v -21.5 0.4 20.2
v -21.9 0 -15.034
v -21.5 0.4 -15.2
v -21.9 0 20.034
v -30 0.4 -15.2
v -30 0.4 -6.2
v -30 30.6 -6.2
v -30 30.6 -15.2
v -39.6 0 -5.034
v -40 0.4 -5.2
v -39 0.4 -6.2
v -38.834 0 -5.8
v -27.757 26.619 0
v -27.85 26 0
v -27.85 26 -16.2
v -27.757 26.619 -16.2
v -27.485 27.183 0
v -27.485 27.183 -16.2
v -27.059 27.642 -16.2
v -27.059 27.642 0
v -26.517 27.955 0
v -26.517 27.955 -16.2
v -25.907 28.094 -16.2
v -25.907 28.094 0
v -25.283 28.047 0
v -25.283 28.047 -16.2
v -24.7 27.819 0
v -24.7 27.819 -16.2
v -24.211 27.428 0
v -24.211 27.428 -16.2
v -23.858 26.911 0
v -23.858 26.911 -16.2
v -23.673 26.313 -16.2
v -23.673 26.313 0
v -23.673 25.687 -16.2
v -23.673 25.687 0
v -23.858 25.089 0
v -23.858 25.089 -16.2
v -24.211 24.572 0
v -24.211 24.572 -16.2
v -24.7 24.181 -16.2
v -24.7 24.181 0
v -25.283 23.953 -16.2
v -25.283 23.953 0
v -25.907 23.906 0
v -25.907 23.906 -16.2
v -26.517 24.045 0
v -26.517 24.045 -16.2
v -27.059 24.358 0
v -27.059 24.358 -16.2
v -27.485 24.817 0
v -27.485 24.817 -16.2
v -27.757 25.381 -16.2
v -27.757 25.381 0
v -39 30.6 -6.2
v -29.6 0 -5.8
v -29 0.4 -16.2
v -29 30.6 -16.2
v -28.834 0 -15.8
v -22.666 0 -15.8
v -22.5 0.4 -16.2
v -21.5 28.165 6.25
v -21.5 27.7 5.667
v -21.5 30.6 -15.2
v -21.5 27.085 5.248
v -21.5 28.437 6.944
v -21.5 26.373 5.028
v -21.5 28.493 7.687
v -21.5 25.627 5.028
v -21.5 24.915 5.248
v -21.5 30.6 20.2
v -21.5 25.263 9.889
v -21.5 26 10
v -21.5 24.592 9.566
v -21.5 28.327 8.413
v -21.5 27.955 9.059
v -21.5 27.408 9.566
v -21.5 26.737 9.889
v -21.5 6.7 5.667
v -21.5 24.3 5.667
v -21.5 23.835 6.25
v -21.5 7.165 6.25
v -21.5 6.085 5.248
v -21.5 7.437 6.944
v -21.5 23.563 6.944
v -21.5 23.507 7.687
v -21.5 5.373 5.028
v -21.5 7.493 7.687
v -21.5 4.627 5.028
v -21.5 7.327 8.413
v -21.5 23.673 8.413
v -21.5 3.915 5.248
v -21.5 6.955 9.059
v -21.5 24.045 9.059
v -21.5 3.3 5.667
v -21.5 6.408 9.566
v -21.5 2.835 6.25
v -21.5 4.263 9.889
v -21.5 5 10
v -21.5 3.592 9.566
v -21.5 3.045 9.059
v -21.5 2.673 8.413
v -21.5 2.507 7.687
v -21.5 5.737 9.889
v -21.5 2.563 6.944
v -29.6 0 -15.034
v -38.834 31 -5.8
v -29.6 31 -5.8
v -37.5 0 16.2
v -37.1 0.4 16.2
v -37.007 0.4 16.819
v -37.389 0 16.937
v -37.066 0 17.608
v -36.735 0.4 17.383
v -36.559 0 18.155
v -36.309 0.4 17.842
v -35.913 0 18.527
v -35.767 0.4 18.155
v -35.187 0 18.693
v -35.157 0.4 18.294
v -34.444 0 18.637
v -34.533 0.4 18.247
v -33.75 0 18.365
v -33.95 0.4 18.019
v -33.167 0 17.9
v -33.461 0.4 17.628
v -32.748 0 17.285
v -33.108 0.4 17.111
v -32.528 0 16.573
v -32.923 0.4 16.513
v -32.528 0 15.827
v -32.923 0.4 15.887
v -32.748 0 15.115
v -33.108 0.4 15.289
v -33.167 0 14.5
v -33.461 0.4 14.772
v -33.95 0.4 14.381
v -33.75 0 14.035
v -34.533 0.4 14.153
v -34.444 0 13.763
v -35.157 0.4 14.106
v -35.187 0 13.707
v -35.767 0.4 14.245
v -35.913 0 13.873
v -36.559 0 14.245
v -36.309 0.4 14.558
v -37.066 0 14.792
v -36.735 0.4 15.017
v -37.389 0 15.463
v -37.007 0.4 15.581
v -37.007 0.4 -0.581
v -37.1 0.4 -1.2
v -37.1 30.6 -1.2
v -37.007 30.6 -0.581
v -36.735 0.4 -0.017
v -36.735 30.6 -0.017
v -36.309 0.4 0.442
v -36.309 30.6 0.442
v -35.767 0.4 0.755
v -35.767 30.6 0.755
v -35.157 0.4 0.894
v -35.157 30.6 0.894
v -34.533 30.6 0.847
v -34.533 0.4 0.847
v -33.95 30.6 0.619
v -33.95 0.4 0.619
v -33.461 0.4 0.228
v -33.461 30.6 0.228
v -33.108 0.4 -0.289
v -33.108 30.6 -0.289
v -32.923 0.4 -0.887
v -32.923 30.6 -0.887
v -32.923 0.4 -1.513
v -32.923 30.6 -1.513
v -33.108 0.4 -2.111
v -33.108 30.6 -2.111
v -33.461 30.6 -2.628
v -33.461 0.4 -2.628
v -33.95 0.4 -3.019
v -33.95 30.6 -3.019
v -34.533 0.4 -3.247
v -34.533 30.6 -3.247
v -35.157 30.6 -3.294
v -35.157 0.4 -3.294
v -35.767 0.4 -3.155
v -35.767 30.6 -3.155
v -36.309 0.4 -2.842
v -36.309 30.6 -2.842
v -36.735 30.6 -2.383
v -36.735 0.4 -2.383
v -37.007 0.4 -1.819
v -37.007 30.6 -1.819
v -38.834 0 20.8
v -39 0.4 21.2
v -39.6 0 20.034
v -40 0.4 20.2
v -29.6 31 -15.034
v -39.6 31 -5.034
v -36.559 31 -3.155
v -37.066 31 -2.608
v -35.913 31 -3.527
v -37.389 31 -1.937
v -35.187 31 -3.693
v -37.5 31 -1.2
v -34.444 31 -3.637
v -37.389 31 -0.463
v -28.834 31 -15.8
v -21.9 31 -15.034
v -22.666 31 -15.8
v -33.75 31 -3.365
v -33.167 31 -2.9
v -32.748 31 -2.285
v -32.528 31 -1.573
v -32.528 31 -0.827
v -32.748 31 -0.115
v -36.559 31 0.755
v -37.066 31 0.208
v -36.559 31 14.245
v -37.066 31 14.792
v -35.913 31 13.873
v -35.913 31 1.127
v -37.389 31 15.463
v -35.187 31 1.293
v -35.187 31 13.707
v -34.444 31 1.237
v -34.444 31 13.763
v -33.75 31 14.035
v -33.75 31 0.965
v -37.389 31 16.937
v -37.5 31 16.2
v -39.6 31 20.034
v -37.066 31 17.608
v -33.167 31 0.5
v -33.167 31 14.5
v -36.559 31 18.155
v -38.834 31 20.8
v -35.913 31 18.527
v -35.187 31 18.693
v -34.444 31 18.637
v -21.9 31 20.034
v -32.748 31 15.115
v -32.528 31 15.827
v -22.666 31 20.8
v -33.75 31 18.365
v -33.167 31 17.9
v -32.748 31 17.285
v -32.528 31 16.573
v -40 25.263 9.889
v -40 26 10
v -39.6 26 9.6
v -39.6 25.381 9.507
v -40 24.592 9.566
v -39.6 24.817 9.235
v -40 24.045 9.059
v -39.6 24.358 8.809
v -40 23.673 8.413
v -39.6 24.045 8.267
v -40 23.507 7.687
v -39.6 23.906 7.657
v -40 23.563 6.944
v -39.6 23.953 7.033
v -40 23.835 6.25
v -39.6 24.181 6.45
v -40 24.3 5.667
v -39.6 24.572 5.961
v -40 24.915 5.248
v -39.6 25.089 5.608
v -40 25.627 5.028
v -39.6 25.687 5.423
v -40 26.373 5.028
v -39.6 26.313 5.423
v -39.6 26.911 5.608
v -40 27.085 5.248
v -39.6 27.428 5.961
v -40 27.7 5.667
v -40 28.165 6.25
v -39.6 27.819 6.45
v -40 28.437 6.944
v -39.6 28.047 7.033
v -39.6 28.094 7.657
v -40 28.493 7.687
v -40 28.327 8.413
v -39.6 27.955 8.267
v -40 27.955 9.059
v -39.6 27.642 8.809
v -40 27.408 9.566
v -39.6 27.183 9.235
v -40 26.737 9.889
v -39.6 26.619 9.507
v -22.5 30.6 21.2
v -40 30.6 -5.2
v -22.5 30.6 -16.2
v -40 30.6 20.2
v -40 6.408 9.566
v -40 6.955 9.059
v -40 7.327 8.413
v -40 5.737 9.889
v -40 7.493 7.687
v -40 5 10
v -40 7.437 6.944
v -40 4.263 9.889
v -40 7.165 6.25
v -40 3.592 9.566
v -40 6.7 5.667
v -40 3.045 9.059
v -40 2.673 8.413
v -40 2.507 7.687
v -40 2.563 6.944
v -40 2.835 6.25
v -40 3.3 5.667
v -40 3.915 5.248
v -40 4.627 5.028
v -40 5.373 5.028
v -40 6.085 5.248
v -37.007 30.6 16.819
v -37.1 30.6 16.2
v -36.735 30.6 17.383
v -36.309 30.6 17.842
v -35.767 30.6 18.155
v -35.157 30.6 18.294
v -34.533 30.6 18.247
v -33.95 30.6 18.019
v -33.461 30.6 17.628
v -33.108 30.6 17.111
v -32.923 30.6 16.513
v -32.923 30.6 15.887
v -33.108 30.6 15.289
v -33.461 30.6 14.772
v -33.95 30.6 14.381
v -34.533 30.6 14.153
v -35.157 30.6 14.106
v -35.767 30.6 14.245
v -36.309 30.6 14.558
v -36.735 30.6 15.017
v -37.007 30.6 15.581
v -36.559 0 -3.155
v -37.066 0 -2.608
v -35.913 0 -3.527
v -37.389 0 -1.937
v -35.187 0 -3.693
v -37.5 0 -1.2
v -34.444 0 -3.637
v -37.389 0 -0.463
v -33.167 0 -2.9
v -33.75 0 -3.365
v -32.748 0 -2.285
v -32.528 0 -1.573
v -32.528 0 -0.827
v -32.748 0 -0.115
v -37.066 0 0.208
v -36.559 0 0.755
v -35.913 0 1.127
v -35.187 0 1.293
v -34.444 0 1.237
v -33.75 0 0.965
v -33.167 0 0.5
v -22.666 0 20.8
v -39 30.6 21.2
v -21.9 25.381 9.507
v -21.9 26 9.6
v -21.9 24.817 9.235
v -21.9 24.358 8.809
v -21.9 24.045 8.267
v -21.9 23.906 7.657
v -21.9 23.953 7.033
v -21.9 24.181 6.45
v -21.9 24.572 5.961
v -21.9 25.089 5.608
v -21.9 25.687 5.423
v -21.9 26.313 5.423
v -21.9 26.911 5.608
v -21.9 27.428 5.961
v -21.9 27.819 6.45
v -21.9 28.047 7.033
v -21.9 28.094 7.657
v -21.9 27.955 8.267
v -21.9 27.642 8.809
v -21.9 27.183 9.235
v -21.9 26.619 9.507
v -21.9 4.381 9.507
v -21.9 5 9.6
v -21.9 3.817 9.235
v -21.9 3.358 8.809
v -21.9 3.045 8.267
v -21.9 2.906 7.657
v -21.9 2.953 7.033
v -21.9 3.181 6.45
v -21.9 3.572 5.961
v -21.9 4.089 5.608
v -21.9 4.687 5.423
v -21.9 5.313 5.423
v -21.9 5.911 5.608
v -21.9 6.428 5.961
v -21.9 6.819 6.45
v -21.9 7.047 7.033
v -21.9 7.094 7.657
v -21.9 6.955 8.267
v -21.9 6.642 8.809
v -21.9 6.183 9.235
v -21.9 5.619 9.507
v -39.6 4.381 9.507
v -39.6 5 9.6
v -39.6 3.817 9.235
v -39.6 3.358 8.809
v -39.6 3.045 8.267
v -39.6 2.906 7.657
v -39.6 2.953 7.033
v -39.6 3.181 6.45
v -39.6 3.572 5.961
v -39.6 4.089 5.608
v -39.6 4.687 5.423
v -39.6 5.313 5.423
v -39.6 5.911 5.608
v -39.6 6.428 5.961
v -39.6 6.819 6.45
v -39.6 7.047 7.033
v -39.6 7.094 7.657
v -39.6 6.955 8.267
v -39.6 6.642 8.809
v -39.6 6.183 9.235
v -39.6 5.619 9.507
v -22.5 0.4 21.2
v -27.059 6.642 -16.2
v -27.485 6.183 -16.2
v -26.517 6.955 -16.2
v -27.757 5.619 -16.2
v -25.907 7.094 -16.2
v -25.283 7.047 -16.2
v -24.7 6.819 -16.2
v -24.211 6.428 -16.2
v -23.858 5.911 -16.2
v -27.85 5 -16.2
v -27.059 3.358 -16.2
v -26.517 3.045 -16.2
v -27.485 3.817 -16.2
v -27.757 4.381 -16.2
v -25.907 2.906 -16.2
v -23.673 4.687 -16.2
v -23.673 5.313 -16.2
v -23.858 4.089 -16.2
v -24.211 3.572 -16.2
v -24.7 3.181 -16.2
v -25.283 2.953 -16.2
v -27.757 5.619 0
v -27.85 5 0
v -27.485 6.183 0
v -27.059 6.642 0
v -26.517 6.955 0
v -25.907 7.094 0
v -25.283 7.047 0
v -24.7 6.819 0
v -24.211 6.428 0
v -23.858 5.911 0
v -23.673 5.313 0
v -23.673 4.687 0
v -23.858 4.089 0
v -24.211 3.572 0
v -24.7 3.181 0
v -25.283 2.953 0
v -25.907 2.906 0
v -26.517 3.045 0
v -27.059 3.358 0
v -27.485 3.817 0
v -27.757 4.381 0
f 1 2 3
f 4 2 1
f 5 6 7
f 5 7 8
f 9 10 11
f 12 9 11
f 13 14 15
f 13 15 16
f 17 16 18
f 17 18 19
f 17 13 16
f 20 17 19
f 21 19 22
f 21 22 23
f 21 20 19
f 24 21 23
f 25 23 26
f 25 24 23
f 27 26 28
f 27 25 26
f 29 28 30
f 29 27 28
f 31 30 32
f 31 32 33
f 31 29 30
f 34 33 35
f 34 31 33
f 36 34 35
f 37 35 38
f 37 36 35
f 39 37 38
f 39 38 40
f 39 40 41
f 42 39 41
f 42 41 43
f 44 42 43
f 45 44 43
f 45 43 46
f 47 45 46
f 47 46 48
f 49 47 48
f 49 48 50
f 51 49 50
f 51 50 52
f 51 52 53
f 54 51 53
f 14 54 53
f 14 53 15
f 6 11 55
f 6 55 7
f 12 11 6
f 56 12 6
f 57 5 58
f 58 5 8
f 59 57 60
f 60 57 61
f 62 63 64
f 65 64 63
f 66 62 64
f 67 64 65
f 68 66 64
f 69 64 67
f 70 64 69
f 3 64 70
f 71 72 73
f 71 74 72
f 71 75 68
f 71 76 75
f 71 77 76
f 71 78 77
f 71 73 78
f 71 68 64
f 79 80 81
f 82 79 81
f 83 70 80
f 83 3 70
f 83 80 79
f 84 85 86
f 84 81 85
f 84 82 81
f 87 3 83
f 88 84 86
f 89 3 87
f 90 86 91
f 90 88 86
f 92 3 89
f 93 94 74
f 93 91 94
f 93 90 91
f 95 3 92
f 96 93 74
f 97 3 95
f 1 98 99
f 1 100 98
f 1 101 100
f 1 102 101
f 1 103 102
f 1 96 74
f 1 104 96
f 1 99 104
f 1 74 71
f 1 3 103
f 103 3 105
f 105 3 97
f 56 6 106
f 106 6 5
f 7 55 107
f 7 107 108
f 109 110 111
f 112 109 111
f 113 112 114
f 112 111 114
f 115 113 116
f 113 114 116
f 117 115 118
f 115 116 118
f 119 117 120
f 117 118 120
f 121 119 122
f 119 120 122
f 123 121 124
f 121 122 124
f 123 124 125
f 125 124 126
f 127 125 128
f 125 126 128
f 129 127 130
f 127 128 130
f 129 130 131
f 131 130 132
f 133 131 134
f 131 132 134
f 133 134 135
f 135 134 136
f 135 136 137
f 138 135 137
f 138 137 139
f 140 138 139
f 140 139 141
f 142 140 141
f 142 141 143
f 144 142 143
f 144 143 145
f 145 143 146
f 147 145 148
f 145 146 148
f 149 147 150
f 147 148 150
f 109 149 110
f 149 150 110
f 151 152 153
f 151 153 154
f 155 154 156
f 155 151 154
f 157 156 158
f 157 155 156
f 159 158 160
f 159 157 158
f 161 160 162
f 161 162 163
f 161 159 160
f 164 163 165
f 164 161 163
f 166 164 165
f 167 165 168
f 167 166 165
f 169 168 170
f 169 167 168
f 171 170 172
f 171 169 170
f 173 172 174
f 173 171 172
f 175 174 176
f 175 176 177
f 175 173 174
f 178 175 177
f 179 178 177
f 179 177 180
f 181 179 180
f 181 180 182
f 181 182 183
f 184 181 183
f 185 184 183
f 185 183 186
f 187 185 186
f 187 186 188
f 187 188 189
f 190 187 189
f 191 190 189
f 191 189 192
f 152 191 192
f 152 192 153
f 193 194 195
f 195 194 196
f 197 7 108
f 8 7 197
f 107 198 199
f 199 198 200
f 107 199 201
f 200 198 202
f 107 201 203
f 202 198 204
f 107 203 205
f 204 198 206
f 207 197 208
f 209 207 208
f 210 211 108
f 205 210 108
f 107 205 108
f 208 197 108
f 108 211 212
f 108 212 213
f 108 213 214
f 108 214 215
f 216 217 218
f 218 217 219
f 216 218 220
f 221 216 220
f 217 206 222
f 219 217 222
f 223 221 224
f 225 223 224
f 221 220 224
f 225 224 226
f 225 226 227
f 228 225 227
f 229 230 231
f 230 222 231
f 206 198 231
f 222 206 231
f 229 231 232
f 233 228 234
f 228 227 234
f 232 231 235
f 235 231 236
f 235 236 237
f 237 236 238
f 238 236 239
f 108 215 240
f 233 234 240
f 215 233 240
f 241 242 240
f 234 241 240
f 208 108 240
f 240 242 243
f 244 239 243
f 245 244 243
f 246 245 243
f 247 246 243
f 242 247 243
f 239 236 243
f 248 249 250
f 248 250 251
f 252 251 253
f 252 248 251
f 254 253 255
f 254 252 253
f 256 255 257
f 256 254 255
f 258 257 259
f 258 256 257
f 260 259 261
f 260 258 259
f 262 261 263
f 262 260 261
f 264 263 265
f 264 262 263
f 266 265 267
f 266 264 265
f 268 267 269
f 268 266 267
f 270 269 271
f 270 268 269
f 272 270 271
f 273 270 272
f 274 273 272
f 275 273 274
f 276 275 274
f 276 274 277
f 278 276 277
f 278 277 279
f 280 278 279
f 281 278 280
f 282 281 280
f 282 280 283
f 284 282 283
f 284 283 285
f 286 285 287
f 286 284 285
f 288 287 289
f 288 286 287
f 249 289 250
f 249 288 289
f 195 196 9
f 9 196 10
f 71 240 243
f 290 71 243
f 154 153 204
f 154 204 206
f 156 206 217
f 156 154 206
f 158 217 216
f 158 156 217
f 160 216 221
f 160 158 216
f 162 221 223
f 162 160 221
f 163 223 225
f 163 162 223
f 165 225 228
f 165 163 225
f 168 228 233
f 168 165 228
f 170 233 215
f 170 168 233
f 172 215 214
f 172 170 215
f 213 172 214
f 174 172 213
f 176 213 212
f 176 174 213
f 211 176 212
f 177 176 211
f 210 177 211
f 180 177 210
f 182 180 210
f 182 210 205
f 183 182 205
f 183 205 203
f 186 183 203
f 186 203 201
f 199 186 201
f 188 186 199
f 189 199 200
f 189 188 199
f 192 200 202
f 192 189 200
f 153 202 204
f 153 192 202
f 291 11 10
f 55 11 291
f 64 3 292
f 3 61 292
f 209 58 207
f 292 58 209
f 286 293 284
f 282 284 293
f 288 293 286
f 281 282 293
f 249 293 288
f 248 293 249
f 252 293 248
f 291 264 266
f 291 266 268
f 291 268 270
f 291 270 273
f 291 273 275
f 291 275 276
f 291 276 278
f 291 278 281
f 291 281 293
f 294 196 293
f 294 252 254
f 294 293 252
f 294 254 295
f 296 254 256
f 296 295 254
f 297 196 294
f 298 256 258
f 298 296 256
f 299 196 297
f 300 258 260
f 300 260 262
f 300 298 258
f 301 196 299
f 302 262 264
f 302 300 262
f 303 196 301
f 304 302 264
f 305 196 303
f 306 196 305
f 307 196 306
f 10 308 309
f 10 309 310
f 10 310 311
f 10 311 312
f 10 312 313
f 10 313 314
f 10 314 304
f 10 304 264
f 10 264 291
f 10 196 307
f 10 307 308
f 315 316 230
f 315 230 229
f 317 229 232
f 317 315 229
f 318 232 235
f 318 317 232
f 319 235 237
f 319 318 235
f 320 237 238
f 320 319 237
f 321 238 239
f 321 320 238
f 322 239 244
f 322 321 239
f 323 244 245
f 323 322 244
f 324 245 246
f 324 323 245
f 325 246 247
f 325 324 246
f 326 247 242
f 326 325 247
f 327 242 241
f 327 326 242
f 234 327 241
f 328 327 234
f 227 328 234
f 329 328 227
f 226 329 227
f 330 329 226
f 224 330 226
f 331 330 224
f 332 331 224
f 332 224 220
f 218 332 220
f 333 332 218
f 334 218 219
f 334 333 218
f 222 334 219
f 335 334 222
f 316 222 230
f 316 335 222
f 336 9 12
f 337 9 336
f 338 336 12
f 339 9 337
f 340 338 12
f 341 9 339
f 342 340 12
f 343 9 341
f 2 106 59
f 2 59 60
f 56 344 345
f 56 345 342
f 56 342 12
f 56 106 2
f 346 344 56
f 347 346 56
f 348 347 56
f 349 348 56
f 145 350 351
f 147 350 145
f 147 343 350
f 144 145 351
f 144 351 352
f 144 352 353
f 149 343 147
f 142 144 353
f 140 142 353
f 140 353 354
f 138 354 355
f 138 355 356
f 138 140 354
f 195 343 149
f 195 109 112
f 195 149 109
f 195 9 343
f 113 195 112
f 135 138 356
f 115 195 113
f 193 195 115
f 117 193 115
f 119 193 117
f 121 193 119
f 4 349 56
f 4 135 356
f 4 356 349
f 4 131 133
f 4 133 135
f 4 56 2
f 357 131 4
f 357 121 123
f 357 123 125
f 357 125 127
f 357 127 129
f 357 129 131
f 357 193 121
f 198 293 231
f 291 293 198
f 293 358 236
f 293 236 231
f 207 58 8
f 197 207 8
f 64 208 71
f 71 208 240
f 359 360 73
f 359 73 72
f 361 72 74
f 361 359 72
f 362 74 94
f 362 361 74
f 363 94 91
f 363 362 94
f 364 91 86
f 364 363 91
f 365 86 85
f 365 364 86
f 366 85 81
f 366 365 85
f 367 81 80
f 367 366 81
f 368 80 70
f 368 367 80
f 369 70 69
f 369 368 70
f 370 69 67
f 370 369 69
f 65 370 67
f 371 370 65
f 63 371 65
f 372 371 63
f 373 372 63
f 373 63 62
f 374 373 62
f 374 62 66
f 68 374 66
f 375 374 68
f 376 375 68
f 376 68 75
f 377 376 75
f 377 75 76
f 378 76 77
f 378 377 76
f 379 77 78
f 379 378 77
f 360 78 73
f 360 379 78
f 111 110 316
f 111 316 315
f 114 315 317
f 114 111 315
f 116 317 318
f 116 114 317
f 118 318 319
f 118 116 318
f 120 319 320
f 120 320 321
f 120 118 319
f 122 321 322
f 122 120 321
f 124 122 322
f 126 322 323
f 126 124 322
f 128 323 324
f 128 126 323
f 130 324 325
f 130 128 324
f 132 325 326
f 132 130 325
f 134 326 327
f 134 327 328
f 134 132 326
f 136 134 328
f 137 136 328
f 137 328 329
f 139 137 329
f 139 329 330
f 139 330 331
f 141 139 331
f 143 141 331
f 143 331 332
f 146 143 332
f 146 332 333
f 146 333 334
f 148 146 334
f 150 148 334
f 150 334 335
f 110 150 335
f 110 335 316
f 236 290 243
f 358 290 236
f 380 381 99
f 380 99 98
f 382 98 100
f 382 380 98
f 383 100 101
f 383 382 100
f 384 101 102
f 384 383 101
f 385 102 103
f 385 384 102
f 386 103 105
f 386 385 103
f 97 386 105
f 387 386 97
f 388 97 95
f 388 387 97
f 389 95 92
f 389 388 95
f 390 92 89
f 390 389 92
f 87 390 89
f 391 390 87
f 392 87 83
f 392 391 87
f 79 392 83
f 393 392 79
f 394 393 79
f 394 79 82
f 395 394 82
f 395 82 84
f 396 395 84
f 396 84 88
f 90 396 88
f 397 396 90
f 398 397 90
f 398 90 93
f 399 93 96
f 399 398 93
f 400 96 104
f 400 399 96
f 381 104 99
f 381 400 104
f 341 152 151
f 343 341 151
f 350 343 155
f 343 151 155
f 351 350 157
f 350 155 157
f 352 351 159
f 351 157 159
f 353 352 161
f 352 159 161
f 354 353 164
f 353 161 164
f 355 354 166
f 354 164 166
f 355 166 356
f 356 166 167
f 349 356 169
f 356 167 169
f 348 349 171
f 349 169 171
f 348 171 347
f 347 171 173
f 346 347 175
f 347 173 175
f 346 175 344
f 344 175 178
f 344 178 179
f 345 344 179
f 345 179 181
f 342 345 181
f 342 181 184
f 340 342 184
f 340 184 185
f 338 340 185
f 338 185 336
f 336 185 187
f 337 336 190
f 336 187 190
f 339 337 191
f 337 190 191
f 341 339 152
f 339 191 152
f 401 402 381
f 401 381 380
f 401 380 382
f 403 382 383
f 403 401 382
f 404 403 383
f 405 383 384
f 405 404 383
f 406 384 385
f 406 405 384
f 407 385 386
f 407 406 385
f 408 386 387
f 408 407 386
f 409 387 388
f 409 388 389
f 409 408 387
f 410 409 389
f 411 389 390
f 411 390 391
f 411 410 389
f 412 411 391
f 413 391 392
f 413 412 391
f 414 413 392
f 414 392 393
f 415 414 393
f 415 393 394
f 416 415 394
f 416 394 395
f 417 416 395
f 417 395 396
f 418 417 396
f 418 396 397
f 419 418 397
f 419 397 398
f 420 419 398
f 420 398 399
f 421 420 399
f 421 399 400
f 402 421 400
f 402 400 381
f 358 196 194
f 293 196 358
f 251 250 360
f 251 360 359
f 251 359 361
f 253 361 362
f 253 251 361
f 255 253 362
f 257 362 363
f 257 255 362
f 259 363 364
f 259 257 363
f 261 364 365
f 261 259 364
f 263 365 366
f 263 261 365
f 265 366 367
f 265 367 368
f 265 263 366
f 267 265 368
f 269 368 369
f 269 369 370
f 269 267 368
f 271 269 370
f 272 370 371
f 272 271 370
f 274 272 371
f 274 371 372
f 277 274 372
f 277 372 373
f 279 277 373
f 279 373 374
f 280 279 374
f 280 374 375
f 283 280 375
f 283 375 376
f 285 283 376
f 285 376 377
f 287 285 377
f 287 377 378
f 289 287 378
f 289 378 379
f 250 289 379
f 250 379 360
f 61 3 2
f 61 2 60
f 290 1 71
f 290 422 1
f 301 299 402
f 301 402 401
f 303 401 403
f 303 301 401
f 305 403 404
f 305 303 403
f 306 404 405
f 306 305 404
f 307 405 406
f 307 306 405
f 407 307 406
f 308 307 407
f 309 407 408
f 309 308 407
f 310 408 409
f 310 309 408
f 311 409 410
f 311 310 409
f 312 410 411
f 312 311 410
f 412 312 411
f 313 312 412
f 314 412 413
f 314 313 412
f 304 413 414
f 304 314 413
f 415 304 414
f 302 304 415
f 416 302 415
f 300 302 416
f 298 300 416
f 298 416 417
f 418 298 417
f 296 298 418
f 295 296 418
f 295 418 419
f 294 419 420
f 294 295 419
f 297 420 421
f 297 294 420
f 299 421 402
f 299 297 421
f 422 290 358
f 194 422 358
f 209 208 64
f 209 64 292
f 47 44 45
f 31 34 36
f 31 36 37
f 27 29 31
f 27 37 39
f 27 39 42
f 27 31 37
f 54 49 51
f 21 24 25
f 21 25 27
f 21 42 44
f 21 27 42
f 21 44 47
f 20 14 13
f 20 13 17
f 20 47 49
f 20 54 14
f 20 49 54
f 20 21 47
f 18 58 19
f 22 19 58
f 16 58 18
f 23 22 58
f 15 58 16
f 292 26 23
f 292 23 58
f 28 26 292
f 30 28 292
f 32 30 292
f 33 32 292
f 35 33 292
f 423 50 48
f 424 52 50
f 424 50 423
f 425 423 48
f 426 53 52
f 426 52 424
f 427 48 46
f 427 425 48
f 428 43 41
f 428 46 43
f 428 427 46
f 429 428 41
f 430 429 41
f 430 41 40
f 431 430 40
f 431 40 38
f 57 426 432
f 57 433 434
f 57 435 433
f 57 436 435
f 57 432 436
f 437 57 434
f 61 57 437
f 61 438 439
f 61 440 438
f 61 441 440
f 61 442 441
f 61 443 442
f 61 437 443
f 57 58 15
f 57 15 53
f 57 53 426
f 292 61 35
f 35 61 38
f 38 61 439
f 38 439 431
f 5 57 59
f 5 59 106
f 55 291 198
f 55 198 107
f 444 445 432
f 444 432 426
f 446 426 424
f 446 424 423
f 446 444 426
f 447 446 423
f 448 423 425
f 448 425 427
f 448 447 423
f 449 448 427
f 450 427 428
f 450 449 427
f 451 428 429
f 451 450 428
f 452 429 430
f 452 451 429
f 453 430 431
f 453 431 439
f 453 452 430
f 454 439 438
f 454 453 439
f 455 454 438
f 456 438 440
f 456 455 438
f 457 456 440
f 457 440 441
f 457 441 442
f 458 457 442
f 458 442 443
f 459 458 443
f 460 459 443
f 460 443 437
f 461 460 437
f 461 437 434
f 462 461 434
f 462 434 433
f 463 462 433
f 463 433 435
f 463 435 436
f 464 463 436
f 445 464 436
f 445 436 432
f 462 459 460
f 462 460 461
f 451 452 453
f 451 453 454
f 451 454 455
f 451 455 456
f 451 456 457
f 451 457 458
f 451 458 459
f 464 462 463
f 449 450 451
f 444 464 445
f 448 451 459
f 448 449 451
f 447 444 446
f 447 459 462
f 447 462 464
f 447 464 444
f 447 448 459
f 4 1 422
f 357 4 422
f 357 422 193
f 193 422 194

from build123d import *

# Parameters (mm, degrees)
PAD022_DEPTH    = 31
SKETCH037_R     = 2.1
POCKET013_DEPTH = 31.001
SKETCH038_R     = 2.1
POCKET014_DEPTH = 16.201
SKETCH039_R     = 2.1
POCKET015_DEPTH = 18.501
CHAMFER002_SIZE = 1
CHAMFER003_SIZE = 0.4
CHAMFER004_SIZE = 0.4


with BuildPart() as sidemotorleftclone:
    # Sketch036 → Pad022 (new body)
    with BuildSketch(Plane.XZ):
        Polygon((21.5, -16.2), (21.5, 21.2), (40, 21.2), (40, -6.2), (30, -6.2), (30, -16.2), align=None)
    extrude(amount=-PAD022_DEPTH)

    # Sketch037 → Pocket013 (cut, through all)
    with BuildSketch(Plane.XZ):
        with Locations((35, 16.2)):
            Circle(SKETCH037_R)
        with Locations((35, -1.2)):
            Circle(SKETCH037_R)
    extrude(amount=-POCKET013_DEPTH, mode=Mode.SUBTRACT)

    # Sketch038 → Pocket014 (cut, through all)
    with BuildSketch(Plane.XY):
        with Locations((25.75, 26)):
            Circle(SKETCH038_R)
        with Locations((25.75, 5)):
            Circle(SKETCH038_R)
    extrude(amount=-POCKET014_DEPTH, mode=Mode.SUBTRACT)

    # Sketch039 (on Face9 of Pocket014) → Pocket015 (cut, through all)
    with BuildSketch(Plane(origin=(40, 0, 0), x_dir=(0, 0, 1), z_dir=(1, 0, 0))):
        with Locations((7.5, -5)):
            Circle(SKETCH039_R)
        with Locations((7.5, -26)):
            Circle(SKETCH039_R)
    extrude(amount=-POCKET015_DEPTH, mode=Mode.SUBTRACT)

    # Chamfer002
    chamfer002_edges = [sidemotorleftclone.edges().sort_by_distance(p)[0] for p in [
        (40, 15.5, 21.2),
        (21.5, 15.5, -16.2),
        (30, 15.5, -16.2),
        (40, 15.5, -6.2),
        (21.5, 15.5, 21.2),
    ]]
    chamfer(chamfer002_edges, length=CHAMFER002_SIZE)

    # Chamfer003
    chamfer003_edges = [sidemotorleftclone.edges().sort_by_distance(p)[0] for p in [
        (21.5, 31, 2.5),
        (22, 31, -15.7),
        (22, 31, 20.7),
        (25.75, 31, -16.2),
        (30.75, 31, 21.2),
        (29.5, 31, -15.7),
        (39.5, 31, 20.7),
        (30, 31, -10.7),
        (40, 31, 7.5),
        (34.5, 31, -6.2),
        (39.5, 31, -5.7),
        (32.9, 31, -1.2),
        (32.9, 31, 16.2),
        (21.5, 0, 2.5),
        (22, 0, -15.7),
        (22, 0, 20.7),
        (25.75, 0, -16.2),
        (30.75, 0, 21.2),
        (29.5, 0, -15.7),
        (39.5, 0, 20.7),
        (30, 0, -10.7),
        (40, 0, 7.5),
        (34.5, 0, -6.2),
        (39.5, 0, -5.7),
        (32.9, 0, -1.2),
        (32.9, 0, 16.2),
    ]]
    chamfer(chamfer003_edges, length=CHAMFER003_SIZE)

    # Chamfer004
    chamfer004_edges = [sidemotorleftclone.edges().sort_by_distance(p)[0] for p in [
        (40, 5, 5.4),
        (40, 26, 5.4),
        (21.5, 5, 5.4),
        (21.5, 26, 5.4),
    ]]
    chamfer(chamfer004_edges, length=CHAMFER004_SIZE)


with BuildPart() as part_mirroring:
    # Part__Mirroring: instance of SideMotorLeftClone
    add(sidemotorleftclone.part.mirror(Plane(origin=(0, 0, 0), x_dir=(0, -1, 0), z_dir=(1, 0, 0))))


solid = part_mirroring.part
